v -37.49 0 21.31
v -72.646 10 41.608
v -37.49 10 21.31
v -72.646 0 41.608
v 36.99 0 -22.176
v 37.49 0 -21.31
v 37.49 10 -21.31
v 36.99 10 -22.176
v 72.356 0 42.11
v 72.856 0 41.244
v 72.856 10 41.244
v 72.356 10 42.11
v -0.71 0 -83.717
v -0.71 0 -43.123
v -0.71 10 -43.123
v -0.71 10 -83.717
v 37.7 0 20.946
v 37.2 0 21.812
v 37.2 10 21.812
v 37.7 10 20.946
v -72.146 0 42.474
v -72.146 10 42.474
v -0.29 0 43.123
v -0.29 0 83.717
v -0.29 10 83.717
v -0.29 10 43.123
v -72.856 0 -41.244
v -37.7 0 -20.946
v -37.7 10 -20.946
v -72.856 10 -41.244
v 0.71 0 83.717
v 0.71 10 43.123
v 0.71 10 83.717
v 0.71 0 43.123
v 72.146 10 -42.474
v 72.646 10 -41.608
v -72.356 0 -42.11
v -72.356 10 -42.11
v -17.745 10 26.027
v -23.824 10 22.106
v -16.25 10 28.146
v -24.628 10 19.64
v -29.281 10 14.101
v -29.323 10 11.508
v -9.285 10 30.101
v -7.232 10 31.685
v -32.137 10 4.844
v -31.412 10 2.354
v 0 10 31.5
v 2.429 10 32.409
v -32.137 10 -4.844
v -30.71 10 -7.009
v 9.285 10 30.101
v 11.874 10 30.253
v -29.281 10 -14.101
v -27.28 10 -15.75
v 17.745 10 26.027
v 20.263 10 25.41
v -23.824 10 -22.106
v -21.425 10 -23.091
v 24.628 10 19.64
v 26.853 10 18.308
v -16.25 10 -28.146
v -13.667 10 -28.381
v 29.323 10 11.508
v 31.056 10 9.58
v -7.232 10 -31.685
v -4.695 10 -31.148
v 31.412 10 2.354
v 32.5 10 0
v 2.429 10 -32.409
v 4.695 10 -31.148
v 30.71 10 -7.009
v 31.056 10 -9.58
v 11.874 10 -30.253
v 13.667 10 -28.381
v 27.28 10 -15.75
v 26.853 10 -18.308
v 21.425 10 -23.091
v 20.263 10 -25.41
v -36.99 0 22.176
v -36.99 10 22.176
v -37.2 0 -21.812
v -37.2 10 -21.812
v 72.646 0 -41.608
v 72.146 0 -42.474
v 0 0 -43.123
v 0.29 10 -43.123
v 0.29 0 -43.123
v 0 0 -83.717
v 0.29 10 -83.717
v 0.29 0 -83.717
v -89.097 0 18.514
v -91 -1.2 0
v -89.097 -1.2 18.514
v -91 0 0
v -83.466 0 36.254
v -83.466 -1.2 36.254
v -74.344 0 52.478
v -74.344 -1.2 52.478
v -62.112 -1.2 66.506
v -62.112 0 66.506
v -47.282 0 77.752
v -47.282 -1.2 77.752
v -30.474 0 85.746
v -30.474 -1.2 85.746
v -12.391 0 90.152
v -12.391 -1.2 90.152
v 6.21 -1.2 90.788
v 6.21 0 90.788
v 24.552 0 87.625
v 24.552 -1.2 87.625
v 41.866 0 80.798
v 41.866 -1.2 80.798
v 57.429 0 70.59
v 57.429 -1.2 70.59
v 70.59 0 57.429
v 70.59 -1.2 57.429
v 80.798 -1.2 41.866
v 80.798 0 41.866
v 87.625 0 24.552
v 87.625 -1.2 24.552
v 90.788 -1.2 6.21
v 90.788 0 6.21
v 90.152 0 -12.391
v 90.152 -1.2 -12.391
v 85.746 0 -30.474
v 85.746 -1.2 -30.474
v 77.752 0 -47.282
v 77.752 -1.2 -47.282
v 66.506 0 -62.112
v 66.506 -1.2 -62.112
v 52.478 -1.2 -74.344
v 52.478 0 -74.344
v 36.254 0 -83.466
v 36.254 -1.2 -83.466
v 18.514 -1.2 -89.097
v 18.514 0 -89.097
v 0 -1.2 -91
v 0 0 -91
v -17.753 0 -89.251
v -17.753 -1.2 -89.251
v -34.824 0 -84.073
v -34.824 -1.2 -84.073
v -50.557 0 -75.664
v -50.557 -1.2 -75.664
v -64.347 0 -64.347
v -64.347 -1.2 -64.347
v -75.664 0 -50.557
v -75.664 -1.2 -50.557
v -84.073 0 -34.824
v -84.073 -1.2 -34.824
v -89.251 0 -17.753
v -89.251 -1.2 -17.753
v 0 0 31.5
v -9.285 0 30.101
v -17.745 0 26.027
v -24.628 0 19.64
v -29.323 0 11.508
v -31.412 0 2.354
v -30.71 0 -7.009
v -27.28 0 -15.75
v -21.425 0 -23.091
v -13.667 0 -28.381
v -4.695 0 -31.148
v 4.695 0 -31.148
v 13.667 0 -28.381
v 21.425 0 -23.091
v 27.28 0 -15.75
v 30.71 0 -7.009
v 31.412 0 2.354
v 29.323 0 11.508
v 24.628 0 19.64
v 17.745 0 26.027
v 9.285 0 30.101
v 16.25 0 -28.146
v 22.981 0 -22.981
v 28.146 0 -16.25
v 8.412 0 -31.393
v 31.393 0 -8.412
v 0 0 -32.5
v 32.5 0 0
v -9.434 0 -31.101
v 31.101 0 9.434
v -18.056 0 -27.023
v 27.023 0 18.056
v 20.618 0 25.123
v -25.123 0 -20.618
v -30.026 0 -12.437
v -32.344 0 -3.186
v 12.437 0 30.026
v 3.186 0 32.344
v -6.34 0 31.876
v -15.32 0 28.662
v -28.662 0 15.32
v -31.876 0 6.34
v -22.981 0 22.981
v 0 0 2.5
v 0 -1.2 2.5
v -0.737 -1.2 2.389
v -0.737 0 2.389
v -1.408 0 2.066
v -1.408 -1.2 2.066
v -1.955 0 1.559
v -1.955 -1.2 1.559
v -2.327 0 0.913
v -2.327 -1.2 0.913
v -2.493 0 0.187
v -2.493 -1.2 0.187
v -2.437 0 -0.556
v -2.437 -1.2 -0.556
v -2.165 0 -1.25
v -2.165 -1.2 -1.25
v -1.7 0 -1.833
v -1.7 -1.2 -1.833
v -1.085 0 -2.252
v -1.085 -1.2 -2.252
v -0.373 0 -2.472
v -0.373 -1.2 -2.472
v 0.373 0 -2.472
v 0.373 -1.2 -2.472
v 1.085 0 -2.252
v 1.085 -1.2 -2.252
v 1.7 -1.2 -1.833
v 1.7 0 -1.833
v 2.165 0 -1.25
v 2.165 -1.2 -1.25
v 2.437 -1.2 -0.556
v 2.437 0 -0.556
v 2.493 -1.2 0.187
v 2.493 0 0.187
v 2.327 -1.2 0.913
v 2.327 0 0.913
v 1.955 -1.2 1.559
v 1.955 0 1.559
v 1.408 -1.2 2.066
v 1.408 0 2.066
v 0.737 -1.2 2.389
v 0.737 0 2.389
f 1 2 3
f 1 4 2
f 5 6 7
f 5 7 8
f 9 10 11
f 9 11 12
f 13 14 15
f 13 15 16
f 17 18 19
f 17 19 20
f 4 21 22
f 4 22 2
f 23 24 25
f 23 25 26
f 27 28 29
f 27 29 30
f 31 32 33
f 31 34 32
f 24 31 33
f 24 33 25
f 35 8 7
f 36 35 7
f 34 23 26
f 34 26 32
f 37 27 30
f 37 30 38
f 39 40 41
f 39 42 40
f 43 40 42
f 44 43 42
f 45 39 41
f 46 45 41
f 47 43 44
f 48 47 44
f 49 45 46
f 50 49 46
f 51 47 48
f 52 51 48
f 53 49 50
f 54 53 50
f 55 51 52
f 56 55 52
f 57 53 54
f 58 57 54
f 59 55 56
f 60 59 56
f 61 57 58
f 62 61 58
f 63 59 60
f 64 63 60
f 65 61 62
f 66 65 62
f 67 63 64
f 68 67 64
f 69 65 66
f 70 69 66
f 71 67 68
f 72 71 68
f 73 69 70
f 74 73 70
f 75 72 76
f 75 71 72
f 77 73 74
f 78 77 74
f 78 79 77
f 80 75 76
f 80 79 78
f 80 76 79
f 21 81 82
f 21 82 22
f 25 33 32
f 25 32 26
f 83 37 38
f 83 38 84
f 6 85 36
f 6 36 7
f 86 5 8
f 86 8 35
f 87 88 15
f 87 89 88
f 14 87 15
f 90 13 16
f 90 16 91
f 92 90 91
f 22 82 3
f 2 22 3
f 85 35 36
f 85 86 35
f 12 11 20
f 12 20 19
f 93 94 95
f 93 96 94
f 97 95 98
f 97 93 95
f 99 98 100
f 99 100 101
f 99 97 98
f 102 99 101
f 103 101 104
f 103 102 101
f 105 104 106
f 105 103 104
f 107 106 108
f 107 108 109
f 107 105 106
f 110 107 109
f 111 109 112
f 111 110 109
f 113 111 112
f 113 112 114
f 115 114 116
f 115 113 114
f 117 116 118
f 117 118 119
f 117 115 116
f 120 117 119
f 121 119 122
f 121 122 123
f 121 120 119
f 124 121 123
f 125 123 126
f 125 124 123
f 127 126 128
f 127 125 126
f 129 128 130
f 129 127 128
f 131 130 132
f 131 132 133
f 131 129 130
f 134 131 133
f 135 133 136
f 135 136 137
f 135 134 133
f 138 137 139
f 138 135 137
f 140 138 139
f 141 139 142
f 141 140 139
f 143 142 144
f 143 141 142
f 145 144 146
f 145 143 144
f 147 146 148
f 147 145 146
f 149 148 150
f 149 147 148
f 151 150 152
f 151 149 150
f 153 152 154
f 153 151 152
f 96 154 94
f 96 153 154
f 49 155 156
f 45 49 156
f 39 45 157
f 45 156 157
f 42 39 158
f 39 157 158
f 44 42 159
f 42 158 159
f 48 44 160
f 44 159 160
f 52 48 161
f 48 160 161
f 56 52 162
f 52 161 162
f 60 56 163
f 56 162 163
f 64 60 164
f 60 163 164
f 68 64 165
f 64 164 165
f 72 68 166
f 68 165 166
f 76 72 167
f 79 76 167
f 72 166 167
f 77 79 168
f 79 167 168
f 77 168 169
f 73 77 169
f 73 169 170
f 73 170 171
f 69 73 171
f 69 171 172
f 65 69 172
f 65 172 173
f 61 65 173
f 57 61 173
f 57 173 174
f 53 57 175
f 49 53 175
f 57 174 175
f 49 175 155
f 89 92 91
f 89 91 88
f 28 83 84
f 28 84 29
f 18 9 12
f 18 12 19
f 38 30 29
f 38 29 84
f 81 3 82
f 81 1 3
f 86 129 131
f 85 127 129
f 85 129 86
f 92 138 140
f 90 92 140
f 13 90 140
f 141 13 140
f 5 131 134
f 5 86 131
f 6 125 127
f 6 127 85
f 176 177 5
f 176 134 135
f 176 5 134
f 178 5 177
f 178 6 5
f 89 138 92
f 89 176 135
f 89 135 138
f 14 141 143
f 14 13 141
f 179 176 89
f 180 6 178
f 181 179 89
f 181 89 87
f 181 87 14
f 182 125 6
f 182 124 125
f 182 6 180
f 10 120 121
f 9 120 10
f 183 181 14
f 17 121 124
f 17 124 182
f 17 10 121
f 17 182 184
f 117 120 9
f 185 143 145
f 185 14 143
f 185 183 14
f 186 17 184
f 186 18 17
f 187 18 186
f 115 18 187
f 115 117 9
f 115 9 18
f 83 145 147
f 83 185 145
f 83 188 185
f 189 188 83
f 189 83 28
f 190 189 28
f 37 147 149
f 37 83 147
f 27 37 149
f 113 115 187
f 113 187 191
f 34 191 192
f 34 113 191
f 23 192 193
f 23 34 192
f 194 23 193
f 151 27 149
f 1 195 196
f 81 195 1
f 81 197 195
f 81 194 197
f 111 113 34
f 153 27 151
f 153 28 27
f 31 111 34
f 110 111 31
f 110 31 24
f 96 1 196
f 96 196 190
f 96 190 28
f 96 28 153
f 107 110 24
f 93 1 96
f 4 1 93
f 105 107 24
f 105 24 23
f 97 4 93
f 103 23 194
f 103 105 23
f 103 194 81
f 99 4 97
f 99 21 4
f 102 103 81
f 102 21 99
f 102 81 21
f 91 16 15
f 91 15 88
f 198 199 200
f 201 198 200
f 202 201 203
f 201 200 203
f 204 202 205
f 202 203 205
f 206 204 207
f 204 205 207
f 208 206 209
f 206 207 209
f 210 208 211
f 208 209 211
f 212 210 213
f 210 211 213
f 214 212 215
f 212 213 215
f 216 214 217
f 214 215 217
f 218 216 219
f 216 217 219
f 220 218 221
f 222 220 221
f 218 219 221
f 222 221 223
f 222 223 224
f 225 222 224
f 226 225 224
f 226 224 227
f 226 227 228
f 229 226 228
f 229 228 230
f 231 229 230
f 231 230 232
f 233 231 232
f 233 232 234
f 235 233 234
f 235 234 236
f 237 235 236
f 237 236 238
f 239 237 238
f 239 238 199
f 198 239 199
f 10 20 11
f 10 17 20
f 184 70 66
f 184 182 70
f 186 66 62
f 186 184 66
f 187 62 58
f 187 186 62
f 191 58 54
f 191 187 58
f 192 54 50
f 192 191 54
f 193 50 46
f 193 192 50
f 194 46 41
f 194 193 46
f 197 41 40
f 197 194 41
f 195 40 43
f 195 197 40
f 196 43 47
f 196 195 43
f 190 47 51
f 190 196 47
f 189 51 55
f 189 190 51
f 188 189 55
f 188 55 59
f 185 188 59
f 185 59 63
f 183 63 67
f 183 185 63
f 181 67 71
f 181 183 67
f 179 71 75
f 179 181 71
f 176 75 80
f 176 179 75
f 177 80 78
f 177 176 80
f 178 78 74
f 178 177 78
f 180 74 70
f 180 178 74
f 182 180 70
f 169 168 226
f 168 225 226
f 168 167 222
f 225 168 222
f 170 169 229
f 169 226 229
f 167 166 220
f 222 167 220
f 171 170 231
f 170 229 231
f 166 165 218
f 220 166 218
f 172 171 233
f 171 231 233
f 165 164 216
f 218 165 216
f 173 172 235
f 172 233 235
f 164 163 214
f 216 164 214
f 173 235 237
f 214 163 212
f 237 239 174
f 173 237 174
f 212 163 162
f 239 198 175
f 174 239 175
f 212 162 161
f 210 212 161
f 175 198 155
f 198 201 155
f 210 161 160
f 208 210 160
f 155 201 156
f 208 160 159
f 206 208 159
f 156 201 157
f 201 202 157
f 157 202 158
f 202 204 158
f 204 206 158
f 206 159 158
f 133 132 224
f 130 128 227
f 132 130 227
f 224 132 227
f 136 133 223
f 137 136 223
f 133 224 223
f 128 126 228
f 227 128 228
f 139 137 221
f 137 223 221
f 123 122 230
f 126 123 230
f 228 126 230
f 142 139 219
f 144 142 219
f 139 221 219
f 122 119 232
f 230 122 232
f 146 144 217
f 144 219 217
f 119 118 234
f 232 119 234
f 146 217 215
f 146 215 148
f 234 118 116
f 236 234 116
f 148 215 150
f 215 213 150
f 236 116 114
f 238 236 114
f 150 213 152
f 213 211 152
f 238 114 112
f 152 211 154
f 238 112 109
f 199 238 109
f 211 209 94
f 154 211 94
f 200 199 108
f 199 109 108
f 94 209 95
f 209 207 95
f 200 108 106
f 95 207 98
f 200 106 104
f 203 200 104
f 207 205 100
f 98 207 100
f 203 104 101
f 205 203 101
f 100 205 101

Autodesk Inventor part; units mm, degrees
ref_plane "YZ Plane" through (0, 0, 0) normal (1, 0, 0) x (0, 1, 0)
ref_plane "XZ Plane" through (0, 0, 0) normal (0, 1, 0) x (-1, 0, 0)
ref_plane "XY Plane" through (0, 0, 0) normal (0, 0, 1) x (1, 0, 0)
sketch "Sketch4" plane through (0, 0, 0) normal (0, 1, 0) x (-1, 0, 0)
  circle A0 centre (0, 0) radius 32.5
  line L0 (85.3525, 23.3053) -> (40.3525, 23.3053)
  line L1 (40.3525, 23.3053) -> (40.3525, -21.6947)
  line L2 (40.3525, -21.6947) -> (85.3525, -21.6947)
  line L3 (85.3525, -21.6947) -> (85.3525, 23.3053)
  line L4 (22.4932, 85.5701) -> (-0.0068, 46.5989)
  line L5 (-0.0068, 46.5989) -> (38.9644, 24.0989)
  line L6 (38.9644, 24.0989) -> (61.4644, 63.0701)
  line L7 (61.4644, 63.0701) -> (22.4932, 85.5701)
  line L8 (-62.8593, 62.2648) -> (-40.3593, 23.2936)
  line L9 (-40.3593, 23.2936) -> (-1.3881, 45.7936)
  line L10 (-1.3881, 45.7936) -> (-23.8881, 84.7648)
  line L11 (-23.8881, 84.7648) -> (-62.8593, 62.2648)
  line L12 (-85.3525, -23.3053) -> (-40.3525, -23.3053)
  line L13 (-40.3525, -23.3053) -> (-40.3525, 21.6947)
  line L14 (-40.3525, 21.6947) -> (-85.3525, 21.6947)
  line L15 (-85.3525, 21.6947) -> (-85.3525, -23.3053)
  line L16 (-22.4932, -85.5701) -> (0.0068, -46.5989)
  line L17 (0.0068, -46.5989) -> (-38.9644, -24.0989)
  line L18 (-38.9644, -24.0989) -> (-61.4644, -63.0701)
  line L19 (-61.4644, -63.0701) -> (-22.4932, -85.5701)
  line L20 (62.8593, -62.2648) -> (40.3593, -23.2936)
  line L21 (40.3593, -23.2936) -> (1.3881, -45.7936)
  line L22 (1.3881, -45.7936) -> (23.8881, -84.7648)
  line L23 (23.8881, -84.7648) -> (62.8593, -62.2648)
  circle A1 centre (0, 0) radius 91
  line L24 (0, -32.5) -> (0, -91)
  dimension "d5" = 65
  dimension "d12" = 182
  dimension "d6" = 45
  dimension "d7" = 45
  dimension "d10" = 360
extrude "Extrusion2" add sketch "Sketch4" against normal blind 1.2 contours A0 | A1 | L17 L16 L24 | L24 L16 L19 L18 L17 | L3 L2 L1 L0 | L7 L6 L5 L4 | L11 L10 L9 L8 | L15 L14 L13 L12 | L23 L22 L21 L20
sketch "Sketch6" plane through (0, 0, 0) normal (0, 1, 0) x (1, 0, 0)
  circle A0 centre (0, 0) radius 42.5
  circle A1 centre (0, 0) radius 91 projected
  line L0 (-0.7102, 83.7173) -> (0.2898, 83.7173)
  line L1 (0.2898, 83.7173) -> (0.2898, 43.1226)
  line L2 (0.2898, 43.1226) -> (-0.7102, 43.1226)
  line L3 (-0.7102, 43.1226) -> (-0.7102, 83.7173)
  dimension "d15" = 85
  dimension "d16" = 1
extrude "Extrusion3" add sketch "Sketch6" along normal blind 10 contours L0 L1 L2 L3
pattern_circular "Circular Pattern1" count 6 over 360 about axis through (0, -10, 0) along (0, 1, 0) of "Extrusion3"
sketch "Sketch7" plane through (0, 0, 0) normal (0, 1, 0) x (1, 0, 0)
  circle A0 centre (0, 0) radius 32.5
  dimension "d24" = 65
extrude "Extrusion4" add sketch "Sketch7" along normal blind 10
sketch "Sketch12" plane through (0, 10, 0) normal (0, 1, 0) x (1, 0, 0)
  point P0 (0, 0)
  point P1 (0, 0)
hole "Hole3" at (0, 10, 0) direction (0, -1, 0) diameter 63 depth 10
sketch "Sketch13" plane through (0, 0, 0) normal (0, 1, 0) x (1, 0, 0)
  point P0 (0, 0)
  point P1 (0, 0)
hole "Hole4" at (0, 0, 0) direction (0, -1, 0) diameter 5 depth 2
properties part number "Plate"
